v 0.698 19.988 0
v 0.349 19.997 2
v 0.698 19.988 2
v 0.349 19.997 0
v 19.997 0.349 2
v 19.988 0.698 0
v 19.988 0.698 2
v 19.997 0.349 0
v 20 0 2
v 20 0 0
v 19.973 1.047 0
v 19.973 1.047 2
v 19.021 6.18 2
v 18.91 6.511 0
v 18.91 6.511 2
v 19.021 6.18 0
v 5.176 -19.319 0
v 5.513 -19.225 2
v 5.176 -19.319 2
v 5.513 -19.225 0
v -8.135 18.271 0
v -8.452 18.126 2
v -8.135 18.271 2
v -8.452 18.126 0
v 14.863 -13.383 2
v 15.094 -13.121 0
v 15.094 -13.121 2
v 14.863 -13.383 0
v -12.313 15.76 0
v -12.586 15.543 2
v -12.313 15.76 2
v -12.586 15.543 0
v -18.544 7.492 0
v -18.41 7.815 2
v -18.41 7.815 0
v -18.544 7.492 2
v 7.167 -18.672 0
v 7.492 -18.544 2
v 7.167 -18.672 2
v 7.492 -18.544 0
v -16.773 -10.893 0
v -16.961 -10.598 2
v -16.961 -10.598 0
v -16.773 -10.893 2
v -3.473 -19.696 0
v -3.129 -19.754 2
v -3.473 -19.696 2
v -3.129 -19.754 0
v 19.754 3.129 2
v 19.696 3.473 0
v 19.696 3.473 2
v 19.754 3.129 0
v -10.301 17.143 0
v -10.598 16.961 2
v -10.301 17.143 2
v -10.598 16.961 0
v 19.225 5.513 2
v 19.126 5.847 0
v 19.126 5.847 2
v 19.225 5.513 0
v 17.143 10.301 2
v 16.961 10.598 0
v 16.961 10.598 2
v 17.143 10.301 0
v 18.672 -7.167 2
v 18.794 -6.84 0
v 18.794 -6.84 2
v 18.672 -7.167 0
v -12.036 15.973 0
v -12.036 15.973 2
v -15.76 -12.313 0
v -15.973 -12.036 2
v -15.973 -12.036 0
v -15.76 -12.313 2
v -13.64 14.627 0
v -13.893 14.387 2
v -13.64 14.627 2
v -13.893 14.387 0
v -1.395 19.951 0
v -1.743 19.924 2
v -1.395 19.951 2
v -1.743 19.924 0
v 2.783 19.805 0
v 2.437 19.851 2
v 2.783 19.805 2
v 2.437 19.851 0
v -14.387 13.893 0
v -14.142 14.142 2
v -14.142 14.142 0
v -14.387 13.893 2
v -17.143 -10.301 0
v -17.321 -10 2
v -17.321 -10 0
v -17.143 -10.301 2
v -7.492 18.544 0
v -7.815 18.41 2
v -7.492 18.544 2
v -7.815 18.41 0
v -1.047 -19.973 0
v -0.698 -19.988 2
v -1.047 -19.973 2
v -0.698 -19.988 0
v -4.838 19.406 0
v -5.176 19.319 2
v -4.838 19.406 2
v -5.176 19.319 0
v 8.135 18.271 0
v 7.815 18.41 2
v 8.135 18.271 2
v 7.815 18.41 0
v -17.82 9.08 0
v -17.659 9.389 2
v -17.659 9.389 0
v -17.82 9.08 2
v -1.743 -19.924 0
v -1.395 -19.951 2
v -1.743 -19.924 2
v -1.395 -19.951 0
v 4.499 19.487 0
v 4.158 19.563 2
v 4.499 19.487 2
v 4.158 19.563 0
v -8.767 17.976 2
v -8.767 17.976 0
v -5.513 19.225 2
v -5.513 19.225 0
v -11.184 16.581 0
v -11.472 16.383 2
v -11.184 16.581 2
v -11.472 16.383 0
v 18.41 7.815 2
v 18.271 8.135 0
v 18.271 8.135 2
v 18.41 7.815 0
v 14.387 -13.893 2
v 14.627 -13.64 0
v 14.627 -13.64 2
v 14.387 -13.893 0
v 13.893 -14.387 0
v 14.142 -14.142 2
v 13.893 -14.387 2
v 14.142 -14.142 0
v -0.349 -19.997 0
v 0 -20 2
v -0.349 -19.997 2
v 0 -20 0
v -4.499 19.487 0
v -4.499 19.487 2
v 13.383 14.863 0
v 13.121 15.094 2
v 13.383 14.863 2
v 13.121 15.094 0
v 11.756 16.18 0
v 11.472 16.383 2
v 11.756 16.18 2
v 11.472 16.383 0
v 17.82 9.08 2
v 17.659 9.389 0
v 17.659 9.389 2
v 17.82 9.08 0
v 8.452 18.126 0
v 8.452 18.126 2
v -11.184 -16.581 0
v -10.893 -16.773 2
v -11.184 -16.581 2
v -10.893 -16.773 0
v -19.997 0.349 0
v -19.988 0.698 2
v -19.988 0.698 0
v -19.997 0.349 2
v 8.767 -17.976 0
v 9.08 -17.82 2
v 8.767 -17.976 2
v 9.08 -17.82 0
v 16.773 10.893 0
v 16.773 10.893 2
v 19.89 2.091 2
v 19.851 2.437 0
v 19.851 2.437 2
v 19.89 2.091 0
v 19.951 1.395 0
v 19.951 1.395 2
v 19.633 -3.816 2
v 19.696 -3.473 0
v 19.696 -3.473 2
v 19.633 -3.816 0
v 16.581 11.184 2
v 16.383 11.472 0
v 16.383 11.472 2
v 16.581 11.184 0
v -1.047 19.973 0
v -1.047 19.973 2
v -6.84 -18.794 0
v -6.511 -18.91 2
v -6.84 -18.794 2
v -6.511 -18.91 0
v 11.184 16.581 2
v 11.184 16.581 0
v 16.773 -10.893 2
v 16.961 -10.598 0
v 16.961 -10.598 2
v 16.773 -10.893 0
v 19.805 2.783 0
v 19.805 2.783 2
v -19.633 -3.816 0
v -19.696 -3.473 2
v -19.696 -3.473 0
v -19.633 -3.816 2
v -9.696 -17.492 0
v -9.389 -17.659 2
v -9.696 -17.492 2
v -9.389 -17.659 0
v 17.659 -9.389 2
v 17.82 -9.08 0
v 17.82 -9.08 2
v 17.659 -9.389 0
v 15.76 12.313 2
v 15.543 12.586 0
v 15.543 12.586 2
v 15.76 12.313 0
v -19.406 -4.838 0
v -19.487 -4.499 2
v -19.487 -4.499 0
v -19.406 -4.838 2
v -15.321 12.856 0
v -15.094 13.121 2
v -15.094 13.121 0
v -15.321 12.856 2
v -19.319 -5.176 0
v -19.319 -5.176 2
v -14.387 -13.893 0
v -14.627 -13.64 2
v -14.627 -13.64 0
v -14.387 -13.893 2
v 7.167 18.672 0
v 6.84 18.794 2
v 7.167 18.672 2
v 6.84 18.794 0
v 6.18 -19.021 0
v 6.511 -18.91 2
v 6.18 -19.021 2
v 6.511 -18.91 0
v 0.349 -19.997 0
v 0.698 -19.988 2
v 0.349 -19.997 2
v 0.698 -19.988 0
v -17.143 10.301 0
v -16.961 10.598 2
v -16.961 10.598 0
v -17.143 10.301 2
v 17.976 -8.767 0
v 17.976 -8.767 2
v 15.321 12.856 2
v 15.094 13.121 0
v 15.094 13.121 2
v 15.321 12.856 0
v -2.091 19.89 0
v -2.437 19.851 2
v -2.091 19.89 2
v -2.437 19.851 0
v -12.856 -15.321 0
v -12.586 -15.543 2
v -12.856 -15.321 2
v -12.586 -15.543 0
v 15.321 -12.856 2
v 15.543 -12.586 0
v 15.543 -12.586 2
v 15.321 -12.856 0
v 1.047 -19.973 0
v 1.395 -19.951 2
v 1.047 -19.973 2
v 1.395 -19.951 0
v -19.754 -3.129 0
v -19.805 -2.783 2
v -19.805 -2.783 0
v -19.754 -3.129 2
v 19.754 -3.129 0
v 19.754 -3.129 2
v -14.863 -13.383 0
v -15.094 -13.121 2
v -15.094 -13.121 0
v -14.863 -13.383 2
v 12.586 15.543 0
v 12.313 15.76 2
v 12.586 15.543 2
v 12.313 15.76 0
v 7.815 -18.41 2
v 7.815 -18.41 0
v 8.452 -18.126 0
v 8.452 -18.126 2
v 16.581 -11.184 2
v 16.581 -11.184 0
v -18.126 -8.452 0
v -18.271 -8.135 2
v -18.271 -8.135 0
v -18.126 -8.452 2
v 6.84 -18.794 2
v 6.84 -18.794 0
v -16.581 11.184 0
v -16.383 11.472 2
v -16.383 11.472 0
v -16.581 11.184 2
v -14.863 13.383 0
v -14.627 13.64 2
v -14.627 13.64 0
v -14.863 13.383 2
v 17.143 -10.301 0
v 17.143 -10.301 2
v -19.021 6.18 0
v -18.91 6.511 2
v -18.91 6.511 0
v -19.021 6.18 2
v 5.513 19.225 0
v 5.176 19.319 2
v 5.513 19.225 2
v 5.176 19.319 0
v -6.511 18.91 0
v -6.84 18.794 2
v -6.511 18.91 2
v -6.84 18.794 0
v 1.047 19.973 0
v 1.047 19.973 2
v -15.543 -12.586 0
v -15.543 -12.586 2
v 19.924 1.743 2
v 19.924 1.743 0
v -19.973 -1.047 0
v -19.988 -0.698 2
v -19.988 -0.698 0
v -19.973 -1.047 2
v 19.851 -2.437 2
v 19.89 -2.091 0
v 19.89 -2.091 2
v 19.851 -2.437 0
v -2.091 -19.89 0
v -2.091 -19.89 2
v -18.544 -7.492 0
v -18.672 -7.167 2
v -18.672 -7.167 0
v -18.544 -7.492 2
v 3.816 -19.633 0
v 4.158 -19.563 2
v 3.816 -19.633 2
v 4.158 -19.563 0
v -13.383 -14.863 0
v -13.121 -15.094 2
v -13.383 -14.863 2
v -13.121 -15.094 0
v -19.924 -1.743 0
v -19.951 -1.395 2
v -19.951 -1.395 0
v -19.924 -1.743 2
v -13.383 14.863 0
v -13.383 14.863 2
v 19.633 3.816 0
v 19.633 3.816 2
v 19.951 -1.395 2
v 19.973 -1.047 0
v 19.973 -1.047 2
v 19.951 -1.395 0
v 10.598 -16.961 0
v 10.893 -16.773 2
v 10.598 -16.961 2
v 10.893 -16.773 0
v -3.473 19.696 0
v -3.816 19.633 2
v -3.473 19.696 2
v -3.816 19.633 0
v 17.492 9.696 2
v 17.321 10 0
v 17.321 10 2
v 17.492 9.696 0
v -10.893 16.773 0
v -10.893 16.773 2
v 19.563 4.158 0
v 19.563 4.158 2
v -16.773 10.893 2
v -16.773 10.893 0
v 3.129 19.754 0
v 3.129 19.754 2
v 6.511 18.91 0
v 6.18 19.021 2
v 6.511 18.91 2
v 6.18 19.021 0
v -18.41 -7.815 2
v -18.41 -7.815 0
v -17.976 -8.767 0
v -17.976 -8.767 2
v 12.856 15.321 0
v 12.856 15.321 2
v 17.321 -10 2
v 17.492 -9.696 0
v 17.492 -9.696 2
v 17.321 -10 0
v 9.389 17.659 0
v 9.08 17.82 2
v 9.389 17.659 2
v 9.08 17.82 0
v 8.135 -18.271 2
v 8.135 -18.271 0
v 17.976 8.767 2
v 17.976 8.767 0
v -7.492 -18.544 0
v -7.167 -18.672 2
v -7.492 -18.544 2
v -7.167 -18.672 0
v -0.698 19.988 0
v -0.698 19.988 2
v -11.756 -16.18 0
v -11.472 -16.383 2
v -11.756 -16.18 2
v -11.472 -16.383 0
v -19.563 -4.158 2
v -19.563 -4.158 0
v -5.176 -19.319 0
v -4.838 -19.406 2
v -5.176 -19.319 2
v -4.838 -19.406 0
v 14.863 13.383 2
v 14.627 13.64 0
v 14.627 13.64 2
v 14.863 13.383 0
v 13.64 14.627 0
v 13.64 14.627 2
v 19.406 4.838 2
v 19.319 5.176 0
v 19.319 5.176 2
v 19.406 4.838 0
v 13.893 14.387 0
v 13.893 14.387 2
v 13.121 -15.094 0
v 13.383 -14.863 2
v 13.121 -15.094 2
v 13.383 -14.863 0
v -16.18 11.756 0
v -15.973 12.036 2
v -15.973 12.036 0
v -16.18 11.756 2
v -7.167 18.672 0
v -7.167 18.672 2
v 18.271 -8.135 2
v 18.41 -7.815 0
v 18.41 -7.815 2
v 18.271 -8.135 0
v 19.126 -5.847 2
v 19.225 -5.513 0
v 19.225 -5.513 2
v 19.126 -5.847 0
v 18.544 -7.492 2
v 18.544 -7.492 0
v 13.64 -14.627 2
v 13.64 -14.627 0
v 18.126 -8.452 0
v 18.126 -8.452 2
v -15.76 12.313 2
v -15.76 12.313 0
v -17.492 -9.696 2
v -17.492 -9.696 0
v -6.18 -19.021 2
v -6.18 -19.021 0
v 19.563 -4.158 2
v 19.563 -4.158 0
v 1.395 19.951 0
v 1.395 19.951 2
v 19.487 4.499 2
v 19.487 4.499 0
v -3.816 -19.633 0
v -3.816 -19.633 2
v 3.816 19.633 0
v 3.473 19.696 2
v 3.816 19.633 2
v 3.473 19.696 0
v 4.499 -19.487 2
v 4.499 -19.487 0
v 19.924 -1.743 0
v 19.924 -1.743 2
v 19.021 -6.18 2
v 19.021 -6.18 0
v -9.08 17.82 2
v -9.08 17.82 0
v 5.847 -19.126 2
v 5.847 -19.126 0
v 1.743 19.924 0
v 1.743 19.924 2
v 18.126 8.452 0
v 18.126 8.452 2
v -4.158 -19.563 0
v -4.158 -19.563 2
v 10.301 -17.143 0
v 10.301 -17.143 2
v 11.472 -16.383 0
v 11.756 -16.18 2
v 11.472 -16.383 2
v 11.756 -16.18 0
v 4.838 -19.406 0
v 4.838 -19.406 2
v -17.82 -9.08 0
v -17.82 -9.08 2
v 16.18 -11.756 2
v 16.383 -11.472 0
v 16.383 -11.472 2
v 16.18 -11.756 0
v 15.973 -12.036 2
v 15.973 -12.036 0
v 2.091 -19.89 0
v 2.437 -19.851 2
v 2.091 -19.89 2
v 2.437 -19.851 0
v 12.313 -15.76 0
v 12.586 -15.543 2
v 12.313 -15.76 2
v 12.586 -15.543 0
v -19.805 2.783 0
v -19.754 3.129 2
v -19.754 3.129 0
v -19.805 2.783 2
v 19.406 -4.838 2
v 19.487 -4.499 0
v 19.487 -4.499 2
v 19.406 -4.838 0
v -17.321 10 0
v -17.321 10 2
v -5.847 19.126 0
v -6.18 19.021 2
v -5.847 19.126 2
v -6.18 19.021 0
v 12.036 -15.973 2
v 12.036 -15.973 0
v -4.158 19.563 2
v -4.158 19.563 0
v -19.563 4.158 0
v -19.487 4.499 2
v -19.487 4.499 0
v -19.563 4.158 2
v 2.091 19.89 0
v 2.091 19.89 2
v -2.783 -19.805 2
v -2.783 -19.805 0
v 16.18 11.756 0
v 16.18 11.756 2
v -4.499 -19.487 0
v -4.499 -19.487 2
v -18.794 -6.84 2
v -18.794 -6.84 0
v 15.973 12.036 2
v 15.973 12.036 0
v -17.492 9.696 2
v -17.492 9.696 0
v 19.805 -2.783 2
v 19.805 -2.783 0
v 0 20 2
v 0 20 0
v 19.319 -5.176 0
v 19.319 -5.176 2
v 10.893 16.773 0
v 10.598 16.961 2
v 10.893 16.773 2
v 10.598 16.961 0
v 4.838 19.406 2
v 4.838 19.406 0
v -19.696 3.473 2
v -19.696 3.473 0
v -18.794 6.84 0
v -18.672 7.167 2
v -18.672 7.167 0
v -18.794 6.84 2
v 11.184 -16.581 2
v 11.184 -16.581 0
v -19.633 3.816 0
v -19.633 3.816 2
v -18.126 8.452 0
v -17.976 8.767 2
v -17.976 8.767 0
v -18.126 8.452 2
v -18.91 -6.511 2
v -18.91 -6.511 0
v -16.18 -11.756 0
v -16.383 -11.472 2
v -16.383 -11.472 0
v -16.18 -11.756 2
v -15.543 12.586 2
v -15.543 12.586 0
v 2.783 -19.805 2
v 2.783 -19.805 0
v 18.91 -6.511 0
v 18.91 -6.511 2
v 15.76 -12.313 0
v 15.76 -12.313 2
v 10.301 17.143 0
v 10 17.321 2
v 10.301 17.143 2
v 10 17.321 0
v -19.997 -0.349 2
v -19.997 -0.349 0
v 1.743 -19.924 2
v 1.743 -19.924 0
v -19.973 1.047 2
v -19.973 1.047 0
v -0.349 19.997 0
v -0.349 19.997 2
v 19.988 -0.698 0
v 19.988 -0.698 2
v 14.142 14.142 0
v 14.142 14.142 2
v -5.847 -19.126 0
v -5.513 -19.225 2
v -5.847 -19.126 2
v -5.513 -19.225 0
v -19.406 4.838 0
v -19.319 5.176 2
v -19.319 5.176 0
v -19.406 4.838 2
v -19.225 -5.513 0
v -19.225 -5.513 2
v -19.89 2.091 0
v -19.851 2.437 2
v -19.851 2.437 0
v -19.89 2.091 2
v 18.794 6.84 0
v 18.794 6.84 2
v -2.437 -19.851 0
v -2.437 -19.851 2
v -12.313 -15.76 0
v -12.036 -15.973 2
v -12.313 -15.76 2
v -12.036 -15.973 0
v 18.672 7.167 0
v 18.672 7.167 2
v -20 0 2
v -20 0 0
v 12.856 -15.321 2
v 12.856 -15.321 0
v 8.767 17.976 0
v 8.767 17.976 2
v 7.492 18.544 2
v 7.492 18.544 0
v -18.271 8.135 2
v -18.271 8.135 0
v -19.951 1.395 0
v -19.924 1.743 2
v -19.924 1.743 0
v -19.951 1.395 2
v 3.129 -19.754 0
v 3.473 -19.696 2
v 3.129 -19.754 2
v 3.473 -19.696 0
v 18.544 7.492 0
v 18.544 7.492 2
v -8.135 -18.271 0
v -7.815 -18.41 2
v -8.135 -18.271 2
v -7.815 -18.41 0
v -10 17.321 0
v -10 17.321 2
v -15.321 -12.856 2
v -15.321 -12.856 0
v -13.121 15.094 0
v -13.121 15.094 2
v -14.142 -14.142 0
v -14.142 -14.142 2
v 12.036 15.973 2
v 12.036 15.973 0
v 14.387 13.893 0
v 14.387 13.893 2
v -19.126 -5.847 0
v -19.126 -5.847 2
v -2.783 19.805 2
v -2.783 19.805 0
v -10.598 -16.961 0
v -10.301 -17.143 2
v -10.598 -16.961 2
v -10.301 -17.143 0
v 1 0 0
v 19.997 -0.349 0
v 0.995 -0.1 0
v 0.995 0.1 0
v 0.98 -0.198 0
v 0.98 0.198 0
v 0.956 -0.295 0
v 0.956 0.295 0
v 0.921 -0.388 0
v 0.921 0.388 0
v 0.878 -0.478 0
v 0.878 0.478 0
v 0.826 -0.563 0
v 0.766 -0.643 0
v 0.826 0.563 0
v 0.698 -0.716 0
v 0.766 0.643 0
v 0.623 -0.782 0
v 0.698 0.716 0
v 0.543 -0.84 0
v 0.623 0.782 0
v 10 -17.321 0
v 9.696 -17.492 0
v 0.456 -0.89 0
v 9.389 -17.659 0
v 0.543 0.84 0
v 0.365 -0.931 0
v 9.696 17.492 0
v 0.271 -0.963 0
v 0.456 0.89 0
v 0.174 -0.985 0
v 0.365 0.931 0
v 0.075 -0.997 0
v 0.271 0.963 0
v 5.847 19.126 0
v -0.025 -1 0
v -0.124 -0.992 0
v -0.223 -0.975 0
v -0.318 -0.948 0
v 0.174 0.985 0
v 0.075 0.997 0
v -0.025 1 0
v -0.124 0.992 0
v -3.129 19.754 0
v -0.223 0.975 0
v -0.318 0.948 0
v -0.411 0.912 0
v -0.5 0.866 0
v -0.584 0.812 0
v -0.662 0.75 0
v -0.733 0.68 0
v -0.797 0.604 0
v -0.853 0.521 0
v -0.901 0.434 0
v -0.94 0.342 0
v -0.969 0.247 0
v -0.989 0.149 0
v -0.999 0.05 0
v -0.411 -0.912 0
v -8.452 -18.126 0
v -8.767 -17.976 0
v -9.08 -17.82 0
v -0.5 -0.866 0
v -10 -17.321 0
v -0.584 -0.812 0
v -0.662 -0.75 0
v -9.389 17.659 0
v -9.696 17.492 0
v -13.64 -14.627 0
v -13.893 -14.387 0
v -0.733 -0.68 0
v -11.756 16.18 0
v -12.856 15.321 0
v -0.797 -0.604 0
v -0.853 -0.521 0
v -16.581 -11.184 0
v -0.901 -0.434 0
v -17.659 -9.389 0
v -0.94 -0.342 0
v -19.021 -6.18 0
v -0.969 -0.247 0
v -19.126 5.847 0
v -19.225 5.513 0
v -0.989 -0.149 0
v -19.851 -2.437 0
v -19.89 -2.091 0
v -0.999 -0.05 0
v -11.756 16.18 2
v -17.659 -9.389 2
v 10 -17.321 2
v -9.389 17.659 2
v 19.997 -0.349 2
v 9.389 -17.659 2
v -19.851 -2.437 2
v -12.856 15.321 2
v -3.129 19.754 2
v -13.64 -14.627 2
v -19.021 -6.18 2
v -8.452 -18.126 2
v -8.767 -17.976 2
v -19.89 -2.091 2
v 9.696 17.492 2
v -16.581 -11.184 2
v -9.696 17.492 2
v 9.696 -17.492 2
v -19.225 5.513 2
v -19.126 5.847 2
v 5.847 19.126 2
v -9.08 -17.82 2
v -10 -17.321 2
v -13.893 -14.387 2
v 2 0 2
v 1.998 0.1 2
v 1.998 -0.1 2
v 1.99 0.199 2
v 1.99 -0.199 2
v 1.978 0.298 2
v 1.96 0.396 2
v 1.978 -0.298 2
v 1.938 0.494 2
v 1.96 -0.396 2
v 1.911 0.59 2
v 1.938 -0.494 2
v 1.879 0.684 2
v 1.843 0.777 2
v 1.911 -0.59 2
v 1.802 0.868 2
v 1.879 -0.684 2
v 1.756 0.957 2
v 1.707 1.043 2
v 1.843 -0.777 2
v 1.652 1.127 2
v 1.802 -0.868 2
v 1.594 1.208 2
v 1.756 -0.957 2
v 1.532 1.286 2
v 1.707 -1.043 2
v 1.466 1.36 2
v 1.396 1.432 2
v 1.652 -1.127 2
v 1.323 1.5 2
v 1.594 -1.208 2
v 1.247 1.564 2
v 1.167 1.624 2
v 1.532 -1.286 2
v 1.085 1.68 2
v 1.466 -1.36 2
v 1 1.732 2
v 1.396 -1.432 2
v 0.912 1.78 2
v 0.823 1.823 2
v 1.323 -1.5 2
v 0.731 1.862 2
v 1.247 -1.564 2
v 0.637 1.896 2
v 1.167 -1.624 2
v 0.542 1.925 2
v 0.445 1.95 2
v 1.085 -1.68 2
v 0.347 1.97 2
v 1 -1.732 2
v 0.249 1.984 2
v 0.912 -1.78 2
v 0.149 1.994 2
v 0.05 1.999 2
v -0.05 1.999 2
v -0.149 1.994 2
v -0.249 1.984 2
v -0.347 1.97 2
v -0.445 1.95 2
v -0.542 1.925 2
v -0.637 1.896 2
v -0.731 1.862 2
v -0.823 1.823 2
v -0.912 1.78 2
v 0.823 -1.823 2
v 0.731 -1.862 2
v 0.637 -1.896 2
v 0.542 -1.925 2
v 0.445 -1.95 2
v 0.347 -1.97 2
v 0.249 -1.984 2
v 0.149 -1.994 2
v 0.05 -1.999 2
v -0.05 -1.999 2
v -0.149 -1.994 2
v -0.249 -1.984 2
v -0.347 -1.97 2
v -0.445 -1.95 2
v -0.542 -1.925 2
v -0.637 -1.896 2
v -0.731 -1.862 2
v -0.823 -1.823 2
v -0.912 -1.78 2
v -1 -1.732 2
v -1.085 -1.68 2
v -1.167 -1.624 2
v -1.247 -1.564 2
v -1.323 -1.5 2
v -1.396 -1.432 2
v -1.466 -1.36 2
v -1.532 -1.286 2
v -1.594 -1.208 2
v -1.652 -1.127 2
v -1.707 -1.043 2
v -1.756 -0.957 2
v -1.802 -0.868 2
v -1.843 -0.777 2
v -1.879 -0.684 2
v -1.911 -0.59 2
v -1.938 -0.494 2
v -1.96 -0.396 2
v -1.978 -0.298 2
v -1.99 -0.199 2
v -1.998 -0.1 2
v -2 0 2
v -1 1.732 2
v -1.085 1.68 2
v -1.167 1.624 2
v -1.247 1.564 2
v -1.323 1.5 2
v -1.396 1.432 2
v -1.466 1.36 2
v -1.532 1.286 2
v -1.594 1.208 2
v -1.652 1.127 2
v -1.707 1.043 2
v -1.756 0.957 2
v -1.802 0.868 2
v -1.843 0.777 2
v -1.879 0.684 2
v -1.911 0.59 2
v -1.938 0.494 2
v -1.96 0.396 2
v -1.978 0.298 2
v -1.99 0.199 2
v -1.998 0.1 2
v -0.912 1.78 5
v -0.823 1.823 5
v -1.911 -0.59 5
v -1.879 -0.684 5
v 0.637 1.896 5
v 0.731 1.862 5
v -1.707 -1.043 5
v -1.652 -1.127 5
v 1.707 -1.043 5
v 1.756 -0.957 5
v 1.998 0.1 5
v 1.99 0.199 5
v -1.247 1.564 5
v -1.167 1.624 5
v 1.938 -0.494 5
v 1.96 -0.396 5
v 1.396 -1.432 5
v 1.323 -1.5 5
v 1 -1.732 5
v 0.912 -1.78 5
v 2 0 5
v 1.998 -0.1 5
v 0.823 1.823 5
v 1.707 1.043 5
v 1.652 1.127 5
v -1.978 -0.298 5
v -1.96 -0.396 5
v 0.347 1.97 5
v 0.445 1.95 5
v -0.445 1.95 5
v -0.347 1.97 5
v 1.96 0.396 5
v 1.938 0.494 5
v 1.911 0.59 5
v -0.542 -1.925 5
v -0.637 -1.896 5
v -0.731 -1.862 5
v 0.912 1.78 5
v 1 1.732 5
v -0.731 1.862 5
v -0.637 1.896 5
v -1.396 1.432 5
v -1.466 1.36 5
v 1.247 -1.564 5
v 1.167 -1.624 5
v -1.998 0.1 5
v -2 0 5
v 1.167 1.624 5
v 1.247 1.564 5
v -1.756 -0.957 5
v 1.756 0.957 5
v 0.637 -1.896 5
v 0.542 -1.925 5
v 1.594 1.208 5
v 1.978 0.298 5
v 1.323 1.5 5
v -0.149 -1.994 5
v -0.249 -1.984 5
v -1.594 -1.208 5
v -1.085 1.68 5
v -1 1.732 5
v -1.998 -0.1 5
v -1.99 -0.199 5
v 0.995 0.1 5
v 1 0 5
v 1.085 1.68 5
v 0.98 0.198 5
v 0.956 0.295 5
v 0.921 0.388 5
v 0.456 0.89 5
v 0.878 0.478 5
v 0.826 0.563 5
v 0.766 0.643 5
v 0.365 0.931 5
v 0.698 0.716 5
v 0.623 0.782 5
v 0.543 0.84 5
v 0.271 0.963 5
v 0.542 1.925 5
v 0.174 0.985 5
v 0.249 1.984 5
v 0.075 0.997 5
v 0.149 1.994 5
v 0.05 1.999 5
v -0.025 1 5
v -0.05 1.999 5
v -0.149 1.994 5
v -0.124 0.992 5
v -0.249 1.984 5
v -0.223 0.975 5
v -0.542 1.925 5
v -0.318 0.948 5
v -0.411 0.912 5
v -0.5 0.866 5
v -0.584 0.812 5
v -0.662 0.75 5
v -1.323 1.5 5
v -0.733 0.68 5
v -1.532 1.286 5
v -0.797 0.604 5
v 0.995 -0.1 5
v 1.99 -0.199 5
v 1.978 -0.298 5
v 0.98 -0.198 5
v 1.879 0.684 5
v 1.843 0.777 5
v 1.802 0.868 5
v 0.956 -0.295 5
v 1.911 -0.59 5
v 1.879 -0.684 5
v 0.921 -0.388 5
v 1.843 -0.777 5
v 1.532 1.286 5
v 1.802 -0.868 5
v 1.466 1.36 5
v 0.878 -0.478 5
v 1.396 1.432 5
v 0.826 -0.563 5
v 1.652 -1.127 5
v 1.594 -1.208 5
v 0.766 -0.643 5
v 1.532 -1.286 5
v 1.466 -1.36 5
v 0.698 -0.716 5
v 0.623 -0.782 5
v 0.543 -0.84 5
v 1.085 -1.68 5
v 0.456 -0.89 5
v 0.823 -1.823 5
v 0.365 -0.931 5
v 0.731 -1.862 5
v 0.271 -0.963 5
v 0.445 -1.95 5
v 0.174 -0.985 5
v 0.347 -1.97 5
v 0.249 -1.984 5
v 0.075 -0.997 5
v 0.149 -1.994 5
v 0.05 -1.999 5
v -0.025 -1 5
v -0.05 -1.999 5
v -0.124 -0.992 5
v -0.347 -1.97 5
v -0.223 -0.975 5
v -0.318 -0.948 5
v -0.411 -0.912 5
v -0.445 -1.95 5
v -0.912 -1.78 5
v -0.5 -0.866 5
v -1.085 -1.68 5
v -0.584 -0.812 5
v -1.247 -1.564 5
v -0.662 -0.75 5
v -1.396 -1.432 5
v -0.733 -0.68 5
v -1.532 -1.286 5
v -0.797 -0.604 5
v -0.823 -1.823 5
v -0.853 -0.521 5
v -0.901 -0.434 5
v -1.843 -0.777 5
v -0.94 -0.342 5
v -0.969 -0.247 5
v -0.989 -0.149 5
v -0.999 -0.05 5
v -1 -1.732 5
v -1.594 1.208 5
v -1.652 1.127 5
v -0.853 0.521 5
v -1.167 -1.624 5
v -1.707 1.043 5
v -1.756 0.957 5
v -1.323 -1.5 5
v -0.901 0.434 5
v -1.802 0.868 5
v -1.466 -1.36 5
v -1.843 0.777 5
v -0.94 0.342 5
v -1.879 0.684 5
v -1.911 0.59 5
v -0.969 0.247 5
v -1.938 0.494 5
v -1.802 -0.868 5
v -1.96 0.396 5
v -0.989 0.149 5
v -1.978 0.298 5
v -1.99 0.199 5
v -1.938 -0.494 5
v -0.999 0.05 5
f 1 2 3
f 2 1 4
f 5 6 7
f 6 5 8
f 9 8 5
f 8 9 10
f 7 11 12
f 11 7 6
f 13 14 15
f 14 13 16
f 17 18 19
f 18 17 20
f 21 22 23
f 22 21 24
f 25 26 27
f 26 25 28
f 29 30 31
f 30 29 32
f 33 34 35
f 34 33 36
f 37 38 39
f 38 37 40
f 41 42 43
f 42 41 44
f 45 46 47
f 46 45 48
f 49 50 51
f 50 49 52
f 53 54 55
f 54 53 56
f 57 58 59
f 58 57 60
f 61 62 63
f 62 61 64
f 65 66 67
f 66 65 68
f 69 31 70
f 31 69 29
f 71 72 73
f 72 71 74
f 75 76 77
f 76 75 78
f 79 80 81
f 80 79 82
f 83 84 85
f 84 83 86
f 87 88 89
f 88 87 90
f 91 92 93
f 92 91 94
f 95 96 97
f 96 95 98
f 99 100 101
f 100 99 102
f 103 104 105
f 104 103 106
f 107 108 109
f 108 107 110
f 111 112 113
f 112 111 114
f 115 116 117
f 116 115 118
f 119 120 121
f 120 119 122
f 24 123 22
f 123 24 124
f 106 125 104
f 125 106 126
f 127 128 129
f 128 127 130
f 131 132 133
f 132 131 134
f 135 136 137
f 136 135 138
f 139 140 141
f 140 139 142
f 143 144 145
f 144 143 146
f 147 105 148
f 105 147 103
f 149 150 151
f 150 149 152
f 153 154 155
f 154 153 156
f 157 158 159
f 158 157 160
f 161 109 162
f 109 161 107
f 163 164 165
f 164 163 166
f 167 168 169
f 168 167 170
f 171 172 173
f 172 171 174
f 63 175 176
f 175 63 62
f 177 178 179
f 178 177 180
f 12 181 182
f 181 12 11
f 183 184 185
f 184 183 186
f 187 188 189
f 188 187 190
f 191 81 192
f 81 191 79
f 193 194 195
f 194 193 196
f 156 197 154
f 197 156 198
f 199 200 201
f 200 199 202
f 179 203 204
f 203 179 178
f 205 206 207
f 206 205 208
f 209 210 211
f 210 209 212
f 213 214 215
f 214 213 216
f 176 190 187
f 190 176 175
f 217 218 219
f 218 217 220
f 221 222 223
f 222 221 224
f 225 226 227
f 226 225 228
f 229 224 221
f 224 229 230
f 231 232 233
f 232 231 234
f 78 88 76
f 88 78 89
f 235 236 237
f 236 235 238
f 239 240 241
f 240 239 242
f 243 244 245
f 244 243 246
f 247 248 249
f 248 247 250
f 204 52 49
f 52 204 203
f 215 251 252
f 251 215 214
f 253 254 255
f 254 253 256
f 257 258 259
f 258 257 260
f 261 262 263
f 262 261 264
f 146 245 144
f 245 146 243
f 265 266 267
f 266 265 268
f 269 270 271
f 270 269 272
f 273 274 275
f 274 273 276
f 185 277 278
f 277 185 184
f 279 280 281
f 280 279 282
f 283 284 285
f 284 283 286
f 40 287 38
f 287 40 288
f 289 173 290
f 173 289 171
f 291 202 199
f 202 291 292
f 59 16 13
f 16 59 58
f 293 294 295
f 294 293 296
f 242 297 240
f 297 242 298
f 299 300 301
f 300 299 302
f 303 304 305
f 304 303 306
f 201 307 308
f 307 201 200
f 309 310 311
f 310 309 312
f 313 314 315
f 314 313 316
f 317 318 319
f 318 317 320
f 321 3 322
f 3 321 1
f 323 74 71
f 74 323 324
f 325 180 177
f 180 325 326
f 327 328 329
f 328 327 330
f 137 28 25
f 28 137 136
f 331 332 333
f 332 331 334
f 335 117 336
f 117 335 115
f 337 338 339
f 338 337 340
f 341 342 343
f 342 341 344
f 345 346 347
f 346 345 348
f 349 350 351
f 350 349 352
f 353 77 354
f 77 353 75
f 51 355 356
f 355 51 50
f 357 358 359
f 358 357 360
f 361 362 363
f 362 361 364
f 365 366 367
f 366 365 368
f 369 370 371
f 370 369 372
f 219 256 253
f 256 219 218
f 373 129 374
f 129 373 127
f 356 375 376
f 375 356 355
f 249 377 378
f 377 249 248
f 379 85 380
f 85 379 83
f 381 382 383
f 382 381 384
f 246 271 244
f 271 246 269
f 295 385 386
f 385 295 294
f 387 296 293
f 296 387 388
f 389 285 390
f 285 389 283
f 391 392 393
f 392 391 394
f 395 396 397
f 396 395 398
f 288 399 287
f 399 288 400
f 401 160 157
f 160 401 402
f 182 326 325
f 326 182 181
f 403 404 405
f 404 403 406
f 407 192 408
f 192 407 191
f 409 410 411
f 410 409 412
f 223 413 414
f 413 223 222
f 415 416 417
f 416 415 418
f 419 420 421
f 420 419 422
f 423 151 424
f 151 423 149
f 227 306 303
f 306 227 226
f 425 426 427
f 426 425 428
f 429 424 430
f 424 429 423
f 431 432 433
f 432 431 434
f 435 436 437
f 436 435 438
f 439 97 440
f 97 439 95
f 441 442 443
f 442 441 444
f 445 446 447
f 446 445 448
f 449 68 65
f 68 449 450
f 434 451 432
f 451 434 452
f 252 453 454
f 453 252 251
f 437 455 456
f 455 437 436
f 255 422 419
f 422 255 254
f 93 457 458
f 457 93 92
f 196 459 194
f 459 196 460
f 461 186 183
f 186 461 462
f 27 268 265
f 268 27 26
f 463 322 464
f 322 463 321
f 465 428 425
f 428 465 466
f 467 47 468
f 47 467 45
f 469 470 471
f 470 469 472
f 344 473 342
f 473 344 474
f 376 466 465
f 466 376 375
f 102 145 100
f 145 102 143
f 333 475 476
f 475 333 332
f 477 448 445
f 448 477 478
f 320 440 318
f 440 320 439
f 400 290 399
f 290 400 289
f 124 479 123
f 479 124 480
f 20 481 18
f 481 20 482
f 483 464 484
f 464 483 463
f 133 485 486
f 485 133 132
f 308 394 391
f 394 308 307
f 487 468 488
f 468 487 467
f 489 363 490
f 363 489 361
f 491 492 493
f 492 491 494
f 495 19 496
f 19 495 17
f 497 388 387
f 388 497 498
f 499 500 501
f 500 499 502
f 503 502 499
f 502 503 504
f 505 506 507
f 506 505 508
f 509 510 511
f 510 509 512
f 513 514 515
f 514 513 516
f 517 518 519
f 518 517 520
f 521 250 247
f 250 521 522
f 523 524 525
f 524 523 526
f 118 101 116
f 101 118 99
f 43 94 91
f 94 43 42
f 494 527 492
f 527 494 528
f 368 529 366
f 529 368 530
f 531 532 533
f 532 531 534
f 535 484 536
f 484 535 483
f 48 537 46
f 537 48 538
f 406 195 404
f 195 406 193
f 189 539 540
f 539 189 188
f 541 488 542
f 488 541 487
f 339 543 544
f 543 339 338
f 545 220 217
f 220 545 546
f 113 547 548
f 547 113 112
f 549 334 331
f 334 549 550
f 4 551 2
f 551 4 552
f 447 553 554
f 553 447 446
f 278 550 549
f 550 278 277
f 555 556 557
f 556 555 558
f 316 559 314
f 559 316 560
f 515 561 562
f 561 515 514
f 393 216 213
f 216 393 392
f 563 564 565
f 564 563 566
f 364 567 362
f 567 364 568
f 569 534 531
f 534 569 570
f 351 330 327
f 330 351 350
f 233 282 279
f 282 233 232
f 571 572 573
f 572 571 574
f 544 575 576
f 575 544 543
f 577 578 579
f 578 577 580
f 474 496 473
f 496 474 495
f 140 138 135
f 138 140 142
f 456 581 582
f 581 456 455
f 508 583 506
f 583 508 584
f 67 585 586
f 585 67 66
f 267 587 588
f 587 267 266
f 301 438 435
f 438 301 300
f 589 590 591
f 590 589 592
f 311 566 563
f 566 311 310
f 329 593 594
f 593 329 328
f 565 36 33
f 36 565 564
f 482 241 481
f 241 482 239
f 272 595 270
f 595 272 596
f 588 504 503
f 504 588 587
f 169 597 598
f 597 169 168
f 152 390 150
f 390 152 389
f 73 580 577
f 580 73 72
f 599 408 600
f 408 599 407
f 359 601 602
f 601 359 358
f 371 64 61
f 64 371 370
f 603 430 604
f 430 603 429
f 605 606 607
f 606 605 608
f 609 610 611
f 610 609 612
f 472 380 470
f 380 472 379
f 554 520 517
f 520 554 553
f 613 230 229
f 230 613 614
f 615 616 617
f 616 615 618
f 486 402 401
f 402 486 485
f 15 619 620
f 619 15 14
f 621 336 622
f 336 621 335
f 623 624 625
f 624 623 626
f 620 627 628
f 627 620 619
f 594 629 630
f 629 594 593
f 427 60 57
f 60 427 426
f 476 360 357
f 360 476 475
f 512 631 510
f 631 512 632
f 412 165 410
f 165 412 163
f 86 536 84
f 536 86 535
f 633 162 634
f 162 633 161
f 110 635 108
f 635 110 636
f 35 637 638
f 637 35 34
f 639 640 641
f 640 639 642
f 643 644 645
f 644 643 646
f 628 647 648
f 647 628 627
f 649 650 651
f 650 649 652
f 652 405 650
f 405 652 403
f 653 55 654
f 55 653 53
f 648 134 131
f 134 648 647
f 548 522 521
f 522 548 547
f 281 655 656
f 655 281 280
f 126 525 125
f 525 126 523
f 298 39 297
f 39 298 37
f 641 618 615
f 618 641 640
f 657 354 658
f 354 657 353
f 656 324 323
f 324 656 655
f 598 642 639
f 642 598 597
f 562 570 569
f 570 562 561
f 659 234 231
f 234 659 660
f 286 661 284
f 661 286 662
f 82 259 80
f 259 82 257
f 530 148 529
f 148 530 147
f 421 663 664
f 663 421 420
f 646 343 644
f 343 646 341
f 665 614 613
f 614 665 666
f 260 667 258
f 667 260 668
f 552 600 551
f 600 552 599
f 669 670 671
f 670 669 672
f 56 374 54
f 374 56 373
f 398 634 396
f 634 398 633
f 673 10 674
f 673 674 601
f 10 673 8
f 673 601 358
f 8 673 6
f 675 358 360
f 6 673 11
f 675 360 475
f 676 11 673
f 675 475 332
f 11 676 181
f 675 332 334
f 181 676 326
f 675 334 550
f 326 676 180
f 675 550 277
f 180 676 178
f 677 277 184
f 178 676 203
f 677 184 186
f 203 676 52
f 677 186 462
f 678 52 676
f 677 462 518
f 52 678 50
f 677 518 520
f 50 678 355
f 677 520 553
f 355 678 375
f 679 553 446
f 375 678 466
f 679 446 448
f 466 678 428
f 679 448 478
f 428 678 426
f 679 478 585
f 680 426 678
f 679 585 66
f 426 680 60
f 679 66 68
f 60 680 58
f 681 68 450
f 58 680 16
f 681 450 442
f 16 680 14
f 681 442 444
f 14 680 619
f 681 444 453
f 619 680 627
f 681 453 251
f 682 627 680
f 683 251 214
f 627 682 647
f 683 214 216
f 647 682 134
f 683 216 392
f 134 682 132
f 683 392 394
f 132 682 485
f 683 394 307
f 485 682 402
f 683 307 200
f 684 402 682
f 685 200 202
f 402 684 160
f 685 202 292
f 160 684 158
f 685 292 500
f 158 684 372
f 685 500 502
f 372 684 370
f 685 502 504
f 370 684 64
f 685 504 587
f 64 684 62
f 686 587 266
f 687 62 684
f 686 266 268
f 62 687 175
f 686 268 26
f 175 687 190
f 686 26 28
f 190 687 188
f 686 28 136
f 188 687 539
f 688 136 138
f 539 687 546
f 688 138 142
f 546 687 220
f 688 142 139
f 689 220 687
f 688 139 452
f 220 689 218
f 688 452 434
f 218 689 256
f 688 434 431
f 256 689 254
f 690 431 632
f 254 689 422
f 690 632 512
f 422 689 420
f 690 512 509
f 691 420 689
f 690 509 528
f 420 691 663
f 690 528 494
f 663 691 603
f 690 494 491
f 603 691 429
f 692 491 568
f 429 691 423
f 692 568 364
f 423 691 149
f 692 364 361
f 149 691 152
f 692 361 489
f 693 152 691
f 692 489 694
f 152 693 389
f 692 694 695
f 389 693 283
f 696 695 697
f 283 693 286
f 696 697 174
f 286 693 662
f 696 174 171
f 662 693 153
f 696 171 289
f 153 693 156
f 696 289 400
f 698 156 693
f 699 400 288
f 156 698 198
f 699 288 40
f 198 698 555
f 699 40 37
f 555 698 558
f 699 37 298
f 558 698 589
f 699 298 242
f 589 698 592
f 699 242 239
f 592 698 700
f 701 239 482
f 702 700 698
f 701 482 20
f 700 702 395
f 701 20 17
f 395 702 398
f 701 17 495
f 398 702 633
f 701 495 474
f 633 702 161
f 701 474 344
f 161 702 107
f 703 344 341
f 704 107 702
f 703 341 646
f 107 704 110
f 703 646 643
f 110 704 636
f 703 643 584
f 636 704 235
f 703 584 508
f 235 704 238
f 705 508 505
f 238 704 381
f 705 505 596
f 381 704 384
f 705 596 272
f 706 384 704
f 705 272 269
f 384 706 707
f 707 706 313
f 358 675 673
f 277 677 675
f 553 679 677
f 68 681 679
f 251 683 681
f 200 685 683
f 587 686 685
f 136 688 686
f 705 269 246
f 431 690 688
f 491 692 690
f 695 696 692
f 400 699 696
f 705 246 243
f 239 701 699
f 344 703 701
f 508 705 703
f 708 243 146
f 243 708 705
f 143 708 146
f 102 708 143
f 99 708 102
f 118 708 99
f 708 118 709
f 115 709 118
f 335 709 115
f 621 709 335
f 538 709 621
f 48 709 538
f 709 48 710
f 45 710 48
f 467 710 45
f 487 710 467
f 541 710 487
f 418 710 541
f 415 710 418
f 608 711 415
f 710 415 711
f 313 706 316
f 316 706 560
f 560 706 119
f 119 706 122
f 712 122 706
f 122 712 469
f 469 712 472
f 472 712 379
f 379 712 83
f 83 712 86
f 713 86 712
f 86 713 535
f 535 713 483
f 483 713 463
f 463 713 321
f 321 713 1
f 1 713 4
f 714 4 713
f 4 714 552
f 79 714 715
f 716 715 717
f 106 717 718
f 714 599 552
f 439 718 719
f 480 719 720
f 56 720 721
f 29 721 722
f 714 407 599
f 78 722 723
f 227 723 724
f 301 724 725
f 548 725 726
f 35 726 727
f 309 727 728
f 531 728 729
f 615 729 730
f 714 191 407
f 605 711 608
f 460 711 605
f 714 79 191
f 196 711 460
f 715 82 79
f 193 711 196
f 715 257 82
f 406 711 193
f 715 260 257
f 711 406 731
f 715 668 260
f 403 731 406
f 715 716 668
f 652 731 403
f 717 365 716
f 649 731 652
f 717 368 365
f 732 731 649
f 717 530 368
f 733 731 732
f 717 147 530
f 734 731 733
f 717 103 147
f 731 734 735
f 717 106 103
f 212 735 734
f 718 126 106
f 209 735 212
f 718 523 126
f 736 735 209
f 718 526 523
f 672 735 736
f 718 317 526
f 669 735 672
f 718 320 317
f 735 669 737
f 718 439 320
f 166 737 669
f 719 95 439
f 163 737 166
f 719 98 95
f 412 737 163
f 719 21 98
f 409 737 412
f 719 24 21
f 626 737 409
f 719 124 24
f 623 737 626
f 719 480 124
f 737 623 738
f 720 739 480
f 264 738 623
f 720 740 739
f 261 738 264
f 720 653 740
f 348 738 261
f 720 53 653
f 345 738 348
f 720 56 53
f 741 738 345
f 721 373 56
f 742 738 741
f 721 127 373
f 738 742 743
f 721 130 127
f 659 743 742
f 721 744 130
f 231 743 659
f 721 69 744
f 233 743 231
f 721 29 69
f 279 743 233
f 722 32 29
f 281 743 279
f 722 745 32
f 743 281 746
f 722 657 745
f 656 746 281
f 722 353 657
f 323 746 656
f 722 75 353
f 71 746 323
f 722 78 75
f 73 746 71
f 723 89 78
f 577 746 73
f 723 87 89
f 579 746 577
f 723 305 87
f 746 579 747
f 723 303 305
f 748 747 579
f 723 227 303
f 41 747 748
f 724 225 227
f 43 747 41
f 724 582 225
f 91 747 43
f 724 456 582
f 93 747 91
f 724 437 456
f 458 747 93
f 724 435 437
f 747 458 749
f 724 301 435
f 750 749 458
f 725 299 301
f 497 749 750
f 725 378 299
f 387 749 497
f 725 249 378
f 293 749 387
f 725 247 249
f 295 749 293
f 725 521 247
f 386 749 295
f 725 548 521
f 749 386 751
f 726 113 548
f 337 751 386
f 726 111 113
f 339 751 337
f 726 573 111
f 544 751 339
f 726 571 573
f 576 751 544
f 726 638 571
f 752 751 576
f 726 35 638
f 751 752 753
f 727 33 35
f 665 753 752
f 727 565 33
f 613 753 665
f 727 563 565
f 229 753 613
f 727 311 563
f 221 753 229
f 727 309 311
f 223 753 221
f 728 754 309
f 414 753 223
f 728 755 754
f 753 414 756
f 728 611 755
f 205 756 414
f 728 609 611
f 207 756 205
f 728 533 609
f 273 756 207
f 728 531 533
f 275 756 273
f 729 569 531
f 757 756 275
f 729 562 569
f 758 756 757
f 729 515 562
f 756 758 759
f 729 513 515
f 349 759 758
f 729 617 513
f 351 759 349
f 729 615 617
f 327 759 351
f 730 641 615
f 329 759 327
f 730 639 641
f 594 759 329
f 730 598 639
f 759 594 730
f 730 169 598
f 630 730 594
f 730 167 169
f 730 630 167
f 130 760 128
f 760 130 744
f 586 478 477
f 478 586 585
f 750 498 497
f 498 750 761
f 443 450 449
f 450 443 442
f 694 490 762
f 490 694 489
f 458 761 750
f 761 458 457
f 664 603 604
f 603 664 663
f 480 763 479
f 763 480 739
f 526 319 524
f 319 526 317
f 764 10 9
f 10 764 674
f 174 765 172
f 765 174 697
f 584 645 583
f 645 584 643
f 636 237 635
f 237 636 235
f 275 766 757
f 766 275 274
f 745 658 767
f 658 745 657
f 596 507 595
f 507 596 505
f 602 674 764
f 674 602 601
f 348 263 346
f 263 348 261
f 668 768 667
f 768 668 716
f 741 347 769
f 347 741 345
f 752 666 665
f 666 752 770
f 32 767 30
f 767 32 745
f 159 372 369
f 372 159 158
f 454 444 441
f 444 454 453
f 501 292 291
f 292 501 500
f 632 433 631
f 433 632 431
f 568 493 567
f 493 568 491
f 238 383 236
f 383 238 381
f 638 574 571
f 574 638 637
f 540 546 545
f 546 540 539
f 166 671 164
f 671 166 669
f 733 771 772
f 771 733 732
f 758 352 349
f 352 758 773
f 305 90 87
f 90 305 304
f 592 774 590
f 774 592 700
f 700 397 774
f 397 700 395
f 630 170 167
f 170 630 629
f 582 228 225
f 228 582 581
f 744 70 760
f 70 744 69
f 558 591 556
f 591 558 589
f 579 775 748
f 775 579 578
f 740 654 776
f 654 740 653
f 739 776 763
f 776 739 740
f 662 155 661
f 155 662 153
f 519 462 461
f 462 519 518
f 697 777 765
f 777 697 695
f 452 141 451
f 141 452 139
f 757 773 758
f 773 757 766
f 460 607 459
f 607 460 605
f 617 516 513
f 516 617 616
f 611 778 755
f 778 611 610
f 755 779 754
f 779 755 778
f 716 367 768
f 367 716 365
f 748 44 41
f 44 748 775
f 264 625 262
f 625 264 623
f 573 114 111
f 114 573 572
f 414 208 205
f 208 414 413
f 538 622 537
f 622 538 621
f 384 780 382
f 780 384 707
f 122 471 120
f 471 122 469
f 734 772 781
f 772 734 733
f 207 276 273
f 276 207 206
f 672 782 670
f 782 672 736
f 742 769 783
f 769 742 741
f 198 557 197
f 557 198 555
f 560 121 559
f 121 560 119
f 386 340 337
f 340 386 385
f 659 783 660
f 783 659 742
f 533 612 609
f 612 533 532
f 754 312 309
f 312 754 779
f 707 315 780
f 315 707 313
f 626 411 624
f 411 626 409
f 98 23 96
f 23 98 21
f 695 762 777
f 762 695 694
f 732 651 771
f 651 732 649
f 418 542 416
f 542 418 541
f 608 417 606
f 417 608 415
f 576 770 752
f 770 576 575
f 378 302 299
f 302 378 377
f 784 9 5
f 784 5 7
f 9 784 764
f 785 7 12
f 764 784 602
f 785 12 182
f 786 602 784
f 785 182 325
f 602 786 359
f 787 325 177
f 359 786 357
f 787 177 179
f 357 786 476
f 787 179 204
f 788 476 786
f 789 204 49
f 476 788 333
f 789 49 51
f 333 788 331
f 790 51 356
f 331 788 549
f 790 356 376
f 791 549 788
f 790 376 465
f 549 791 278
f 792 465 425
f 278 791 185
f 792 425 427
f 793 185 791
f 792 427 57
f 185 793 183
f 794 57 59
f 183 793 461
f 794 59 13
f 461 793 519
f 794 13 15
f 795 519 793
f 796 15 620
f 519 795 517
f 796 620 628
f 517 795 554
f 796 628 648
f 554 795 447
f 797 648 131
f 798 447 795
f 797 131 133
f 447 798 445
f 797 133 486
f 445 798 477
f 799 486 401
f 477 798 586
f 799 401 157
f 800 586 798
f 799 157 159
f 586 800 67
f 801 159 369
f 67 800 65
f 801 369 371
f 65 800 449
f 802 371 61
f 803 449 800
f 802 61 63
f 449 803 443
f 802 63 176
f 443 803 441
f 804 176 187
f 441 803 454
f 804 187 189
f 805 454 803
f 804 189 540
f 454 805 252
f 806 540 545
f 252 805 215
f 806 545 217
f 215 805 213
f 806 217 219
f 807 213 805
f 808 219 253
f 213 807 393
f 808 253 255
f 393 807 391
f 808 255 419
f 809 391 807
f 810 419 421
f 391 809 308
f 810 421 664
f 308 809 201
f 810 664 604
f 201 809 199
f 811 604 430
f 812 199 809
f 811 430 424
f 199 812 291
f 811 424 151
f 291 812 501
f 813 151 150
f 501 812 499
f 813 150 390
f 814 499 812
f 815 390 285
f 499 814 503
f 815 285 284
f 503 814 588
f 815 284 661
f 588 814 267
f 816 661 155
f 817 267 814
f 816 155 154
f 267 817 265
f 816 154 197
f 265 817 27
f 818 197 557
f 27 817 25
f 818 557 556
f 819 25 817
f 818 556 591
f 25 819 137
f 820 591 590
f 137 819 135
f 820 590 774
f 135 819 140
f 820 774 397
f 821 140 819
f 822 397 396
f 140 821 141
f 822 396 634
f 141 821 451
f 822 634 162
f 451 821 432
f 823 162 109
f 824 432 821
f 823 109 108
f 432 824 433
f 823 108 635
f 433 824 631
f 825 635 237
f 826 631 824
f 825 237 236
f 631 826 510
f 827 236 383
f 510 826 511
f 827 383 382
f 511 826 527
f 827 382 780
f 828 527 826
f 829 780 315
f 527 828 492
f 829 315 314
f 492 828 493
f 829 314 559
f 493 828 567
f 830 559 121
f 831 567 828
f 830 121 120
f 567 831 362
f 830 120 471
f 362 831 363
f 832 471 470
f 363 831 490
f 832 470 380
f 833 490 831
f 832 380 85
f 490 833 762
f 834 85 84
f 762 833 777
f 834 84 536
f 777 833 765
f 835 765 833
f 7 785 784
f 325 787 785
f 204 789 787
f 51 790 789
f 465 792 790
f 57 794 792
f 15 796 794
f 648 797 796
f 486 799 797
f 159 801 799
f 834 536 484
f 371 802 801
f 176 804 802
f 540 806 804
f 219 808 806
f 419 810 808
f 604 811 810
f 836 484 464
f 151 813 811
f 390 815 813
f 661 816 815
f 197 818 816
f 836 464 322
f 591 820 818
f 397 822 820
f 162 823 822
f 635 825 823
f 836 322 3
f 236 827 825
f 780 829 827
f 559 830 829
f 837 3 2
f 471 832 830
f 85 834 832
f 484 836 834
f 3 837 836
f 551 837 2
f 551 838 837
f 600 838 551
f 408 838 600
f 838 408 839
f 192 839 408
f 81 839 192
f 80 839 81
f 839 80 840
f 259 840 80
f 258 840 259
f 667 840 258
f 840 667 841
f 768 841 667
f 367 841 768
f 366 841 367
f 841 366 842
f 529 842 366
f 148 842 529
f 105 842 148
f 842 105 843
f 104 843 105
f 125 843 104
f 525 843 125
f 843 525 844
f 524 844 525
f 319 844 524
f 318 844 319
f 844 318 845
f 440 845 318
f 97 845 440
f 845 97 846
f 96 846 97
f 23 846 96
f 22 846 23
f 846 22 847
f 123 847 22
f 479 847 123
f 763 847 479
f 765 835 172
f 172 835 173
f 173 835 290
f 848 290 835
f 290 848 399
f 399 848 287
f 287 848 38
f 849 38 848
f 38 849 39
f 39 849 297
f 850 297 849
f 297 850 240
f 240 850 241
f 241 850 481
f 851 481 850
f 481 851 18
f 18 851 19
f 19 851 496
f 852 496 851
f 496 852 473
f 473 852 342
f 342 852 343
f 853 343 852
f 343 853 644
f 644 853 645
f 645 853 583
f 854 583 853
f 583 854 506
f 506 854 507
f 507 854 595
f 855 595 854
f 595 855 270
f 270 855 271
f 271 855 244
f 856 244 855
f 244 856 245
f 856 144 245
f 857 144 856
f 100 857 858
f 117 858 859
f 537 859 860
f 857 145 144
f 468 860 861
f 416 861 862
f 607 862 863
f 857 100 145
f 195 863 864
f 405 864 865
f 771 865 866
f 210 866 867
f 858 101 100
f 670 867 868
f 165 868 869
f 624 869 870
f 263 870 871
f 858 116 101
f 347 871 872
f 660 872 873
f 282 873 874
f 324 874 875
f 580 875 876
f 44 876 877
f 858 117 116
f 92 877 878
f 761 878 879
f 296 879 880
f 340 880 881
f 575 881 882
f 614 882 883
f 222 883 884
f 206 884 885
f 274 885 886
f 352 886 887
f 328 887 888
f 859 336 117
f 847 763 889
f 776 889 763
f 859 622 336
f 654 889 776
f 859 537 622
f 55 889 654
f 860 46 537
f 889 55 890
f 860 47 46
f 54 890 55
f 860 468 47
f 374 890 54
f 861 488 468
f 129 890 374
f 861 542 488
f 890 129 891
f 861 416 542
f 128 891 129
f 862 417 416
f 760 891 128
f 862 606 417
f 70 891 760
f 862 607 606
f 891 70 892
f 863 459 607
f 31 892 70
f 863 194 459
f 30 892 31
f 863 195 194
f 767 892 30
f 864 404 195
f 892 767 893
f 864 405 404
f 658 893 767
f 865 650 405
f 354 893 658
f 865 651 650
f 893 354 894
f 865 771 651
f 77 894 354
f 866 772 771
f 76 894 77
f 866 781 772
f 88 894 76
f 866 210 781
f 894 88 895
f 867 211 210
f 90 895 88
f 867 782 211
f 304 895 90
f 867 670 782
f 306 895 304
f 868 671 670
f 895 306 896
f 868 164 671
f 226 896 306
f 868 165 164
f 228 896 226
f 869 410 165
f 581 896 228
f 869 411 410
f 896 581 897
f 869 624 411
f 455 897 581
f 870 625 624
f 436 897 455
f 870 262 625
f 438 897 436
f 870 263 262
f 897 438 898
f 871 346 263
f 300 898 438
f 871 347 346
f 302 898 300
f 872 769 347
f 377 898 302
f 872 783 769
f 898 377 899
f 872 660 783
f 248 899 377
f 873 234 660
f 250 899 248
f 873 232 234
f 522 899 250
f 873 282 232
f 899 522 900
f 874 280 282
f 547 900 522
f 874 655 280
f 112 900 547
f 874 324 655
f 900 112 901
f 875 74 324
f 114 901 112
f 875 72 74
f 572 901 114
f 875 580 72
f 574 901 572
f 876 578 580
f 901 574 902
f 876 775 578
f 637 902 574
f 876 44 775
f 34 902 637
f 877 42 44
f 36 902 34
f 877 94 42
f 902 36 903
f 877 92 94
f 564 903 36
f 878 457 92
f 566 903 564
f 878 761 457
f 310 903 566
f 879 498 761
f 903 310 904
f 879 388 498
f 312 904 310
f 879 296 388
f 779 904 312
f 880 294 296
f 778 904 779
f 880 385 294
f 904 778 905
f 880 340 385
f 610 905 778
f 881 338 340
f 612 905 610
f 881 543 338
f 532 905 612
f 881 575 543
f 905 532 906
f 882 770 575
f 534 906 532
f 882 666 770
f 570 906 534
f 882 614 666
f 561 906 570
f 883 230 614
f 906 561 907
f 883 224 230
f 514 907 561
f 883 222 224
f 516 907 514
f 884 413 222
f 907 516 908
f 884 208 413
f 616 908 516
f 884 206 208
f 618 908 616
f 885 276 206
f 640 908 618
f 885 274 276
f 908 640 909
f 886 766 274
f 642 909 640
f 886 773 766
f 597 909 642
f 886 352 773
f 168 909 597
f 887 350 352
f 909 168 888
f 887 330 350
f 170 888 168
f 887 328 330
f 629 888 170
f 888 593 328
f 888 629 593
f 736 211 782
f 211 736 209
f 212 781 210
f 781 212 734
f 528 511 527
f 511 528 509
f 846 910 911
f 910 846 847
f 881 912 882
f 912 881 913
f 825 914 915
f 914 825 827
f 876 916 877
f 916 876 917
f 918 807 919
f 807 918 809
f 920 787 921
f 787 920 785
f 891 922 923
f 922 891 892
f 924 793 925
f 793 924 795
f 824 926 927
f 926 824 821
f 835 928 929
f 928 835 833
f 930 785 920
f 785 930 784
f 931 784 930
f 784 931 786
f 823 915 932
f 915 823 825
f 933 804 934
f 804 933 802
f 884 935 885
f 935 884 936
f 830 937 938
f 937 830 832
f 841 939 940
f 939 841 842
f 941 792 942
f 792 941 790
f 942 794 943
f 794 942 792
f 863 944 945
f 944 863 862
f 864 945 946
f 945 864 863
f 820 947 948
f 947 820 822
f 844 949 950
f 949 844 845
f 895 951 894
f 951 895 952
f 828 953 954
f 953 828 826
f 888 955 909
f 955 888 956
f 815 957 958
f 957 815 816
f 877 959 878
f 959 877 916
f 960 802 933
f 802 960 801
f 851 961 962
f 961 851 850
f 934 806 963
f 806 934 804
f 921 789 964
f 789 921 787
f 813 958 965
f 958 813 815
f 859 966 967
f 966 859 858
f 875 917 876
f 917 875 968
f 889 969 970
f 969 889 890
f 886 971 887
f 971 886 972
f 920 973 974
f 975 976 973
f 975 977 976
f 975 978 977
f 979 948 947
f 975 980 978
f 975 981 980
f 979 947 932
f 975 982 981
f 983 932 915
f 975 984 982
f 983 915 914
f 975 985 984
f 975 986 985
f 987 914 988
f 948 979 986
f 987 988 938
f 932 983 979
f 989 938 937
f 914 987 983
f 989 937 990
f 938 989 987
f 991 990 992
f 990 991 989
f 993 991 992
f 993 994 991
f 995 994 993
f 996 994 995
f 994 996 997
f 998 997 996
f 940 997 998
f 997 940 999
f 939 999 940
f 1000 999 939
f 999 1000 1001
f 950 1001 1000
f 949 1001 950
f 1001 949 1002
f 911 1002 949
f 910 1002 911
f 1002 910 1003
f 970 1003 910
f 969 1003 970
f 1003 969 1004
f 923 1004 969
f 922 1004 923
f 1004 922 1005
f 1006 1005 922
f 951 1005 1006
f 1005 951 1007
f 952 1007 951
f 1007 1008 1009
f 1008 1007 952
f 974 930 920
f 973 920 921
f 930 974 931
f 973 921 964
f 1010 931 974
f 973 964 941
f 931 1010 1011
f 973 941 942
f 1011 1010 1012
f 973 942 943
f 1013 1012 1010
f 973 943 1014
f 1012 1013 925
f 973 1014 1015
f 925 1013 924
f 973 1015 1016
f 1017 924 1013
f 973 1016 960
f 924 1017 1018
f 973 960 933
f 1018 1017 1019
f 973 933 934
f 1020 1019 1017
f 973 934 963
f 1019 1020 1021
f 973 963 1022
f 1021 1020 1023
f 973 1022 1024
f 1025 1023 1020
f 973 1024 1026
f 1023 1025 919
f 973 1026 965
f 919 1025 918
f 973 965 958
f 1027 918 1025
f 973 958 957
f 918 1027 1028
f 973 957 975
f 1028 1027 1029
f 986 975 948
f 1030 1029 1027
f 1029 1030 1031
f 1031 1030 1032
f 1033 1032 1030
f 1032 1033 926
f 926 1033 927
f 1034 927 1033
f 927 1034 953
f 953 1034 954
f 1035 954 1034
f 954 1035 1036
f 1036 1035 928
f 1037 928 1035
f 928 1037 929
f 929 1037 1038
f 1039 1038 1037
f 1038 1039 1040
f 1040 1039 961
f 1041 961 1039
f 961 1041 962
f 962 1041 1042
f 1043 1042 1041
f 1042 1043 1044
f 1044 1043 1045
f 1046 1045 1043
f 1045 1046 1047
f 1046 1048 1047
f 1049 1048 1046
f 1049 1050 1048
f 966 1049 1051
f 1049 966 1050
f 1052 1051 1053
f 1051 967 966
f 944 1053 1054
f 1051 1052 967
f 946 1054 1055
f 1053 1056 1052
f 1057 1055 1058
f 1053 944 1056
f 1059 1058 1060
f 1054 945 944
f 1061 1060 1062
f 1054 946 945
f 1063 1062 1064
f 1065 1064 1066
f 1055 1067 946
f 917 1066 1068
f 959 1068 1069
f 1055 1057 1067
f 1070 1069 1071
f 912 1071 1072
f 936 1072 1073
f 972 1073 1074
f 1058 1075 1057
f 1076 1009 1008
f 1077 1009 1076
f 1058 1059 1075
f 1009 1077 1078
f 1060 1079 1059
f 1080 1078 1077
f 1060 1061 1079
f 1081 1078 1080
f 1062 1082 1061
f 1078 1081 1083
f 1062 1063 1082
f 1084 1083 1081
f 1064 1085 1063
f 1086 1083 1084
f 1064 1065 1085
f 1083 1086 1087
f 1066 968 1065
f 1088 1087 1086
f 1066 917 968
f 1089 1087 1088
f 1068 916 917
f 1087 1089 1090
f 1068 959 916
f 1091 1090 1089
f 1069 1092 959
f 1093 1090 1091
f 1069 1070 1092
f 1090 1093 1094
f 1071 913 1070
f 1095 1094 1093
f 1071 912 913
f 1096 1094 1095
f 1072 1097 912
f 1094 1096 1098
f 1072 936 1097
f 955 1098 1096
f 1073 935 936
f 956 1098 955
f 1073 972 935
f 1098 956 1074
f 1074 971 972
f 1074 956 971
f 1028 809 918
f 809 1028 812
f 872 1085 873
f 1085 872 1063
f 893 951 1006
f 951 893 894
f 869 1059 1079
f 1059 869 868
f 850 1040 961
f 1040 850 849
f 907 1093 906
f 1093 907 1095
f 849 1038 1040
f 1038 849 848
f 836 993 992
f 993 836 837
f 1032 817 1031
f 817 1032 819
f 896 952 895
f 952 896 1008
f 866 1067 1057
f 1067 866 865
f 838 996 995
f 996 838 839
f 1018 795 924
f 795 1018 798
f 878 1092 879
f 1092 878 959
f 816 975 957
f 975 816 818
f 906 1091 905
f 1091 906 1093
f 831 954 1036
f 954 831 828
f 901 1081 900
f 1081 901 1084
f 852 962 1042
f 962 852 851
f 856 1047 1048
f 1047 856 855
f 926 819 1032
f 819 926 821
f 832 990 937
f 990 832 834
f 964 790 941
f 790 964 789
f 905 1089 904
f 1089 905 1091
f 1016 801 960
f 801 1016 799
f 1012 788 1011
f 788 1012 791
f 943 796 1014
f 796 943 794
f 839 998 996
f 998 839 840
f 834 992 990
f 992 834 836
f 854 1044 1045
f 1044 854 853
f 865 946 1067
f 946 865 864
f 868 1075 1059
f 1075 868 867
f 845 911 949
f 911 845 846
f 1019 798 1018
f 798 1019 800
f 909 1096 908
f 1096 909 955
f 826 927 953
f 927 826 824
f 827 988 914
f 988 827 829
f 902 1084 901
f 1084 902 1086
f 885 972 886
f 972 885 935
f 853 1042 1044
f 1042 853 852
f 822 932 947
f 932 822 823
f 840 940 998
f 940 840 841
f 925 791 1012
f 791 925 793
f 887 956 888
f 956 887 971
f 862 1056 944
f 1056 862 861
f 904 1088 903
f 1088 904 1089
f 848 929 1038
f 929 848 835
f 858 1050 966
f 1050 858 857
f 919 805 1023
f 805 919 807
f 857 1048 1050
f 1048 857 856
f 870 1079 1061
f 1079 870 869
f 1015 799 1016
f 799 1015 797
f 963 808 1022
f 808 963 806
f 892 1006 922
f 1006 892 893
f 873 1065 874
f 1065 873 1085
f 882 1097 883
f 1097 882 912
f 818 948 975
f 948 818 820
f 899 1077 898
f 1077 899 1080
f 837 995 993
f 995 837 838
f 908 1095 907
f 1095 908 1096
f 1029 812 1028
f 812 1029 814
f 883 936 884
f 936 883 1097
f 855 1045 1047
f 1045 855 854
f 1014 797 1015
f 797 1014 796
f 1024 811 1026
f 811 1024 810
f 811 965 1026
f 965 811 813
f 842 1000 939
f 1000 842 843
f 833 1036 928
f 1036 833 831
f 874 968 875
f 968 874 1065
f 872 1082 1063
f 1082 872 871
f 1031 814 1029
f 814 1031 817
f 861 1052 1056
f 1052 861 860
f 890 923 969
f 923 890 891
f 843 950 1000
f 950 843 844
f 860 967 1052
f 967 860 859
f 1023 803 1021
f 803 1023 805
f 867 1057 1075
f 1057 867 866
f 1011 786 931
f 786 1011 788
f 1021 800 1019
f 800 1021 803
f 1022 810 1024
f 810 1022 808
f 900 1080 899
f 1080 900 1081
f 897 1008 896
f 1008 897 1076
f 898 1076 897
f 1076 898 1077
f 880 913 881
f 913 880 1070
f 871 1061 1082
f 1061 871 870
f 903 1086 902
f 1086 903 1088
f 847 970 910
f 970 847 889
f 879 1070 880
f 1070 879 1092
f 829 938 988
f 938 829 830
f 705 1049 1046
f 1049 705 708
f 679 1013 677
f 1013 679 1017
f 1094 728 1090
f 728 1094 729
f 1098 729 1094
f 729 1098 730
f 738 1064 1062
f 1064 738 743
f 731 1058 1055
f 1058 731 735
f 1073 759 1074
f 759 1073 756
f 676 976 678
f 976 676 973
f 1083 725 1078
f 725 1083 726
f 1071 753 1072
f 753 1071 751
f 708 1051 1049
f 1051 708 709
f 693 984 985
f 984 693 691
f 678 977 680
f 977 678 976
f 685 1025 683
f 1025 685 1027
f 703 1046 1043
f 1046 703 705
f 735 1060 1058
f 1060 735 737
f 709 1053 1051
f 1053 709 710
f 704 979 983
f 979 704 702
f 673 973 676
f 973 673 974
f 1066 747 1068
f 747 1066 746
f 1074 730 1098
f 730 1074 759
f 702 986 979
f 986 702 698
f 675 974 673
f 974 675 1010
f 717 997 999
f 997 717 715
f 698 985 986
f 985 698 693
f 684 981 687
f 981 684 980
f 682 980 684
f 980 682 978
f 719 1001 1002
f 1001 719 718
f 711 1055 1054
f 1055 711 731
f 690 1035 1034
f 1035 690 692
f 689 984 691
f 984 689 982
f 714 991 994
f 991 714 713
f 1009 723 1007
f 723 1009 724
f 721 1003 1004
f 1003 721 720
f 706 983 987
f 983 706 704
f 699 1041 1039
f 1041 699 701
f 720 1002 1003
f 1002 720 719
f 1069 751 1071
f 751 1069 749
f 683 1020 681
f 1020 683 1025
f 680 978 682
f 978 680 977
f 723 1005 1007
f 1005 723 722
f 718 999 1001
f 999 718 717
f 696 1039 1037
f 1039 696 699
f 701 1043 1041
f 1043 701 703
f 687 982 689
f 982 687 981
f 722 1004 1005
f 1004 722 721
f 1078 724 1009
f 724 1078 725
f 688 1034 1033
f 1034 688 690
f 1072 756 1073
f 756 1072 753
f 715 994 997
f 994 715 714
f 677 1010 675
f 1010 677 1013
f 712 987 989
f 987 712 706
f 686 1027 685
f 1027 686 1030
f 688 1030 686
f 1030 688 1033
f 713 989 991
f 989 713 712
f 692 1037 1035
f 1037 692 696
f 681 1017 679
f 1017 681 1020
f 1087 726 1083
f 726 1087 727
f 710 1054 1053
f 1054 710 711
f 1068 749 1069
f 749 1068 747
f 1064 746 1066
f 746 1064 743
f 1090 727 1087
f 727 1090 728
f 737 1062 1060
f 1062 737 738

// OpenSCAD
$fs = 0.1;
$fa = 1;

difference() {
	union() {
		cylinder(h=2, r=20);
		cylinder(h=5, r=2);
	}
	cylinder(h=5, r=1);
}
